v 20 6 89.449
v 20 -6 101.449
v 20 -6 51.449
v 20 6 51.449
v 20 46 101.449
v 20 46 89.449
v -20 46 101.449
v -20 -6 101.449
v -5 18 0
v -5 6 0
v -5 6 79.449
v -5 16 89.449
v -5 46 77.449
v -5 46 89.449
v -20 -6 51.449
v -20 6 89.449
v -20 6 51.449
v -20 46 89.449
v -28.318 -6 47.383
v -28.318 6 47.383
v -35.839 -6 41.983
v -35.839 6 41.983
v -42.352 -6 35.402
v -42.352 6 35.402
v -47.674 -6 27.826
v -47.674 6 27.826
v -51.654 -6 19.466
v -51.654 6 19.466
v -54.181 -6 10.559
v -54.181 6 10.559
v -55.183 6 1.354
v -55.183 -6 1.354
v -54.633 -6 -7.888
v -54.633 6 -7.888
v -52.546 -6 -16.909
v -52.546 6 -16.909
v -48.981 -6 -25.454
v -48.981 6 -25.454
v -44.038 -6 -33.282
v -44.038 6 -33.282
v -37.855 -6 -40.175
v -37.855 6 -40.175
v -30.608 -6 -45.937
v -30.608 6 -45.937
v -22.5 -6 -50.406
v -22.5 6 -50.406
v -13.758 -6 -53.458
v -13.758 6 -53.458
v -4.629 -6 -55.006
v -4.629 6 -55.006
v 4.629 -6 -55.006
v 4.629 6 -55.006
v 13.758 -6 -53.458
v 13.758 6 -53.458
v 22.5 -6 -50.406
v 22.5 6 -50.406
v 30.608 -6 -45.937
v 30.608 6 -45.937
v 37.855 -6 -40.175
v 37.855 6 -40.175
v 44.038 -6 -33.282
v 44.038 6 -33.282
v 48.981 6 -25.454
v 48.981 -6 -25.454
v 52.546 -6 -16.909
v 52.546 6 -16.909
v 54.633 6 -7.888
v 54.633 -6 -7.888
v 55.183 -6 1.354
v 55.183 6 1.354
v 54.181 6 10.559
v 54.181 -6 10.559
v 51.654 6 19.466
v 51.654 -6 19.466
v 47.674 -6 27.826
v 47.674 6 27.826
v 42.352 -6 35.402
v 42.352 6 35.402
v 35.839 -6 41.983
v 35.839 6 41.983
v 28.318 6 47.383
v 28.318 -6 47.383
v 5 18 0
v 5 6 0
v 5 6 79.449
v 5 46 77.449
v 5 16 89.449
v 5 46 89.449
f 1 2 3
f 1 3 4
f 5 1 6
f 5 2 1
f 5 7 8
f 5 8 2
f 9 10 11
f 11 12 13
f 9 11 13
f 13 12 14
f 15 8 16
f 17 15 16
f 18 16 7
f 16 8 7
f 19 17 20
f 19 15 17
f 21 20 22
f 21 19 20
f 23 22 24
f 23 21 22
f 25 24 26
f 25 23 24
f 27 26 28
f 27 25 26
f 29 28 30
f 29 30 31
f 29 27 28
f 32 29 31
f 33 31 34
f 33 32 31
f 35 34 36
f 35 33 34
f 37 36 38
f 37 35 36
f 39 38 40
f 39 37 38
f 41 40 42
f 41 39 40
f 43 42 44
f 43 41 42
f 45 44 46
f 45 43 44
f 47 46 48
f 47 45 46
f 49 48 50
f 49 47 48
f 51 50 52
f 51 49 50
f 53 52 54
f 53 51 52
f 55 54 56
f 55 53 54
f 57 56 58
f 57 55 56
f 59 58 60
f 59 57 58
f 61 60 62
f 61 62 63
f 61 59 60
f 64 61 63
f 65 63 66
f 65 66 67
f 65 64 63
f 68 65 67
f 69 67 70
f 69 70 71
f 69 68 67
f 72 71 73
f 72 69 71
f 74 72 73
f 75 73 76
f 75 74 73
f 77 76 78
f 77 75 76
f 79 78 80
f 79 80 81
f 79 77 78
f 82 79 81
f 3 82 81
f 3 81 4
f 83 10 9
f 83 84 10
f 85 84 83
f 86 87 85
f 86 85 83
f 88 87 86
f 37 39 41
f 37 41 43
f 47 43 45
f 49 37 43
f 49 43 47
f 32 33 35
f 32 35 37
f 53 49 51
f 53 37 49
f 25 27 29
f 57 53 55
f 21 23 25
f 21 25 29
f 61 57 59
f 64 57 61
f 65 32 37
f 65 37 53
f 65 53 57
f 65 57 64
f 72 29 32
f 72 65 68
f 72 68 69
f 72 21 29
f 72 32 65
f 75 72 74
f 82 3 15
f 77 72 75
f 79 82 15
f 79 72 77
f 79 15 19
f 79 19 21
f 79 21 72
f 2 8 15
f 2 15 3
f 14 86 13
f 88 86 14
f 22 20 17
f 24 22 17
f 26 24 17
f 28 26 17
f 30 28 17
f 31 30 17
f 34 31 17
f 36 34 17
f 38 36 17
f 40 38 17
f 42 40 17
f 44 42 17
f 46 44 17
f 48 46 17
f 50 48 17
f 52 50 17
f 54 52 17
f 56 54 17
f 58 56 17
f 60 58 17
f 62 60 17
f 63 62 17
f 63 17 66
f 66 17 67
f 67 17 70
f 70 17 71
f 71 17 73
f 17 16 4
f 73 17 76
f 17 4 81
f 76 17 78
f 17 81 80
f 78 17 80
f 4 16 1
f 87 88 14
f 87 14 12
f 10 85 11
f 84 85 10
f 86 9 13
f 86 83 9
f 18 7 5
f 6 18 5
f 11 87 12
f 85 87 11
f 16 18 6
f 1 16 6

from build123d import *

# Parameters (mm, degrees)
F1_DEPTH = 6
F2_W     = 40
F2_H     = 40
F3_DEPTH = 12
F5_DEPTH = 5


with BuildPart() as f1:
    # F0 (on Front) → F1 (new body, symmetric)
    with BuildSketch(Plane.XZ):
        with BuildLine():
            ThreePointArc((-20, 51.4493926106), (-31.169215582, -45.5578752797), (55.2, 0))
            ThreePointArc((55.2, 0), (45.5578752797, 31.169215582), (20, 51.4493926106))
            Line((20, 51.4493926106), (-20, 51.4493926106))
        make_face()
        with BuildLine():
            Line((-20, 51.4493926106), (20, 51.4493926106))
            ThreePointArc((20, 51.4493926106), (0, 55.2), (-20, 51.4493926106))
        make_face()
        with BuildLine():
            ThreePointArc((-20, 51.4493926106), (0, 55.2), (20, 51.4493926106))
            Line((20, 51.4493926106), (20, 101.4493926106))
            Line((20, 101.4493926106), (-20, 101.4493926106))
            Line((-20, 101.4493926106), (-20, 51.4493926106))
        make_face()
    extrude(amount=F1_DEPTH, both=True)

    # F2 (on face) → F3 (join)
    with BuildSketch(Plane.XY.offset(101.4493926106)):
        with Locations((0, 26)):
            Rectangle(F2_W, F2_H)
    extrude(amount=-F3_DEPTH)


with BuildPart() as f5:
    # F4 (on Right) → F5 (new body, symmetric)
    with BuildSketch(Plane.YZ):
        Polygon((46, 77.4493926106), (46, 89.4493926106), (16, 89.4493926106), (6, 79.4493926106), (6, 0), (18, 0), align=None)
    extrude(amount=F5_DEPTH, both=True)


solid = Compound([f1.part, f5.part])
